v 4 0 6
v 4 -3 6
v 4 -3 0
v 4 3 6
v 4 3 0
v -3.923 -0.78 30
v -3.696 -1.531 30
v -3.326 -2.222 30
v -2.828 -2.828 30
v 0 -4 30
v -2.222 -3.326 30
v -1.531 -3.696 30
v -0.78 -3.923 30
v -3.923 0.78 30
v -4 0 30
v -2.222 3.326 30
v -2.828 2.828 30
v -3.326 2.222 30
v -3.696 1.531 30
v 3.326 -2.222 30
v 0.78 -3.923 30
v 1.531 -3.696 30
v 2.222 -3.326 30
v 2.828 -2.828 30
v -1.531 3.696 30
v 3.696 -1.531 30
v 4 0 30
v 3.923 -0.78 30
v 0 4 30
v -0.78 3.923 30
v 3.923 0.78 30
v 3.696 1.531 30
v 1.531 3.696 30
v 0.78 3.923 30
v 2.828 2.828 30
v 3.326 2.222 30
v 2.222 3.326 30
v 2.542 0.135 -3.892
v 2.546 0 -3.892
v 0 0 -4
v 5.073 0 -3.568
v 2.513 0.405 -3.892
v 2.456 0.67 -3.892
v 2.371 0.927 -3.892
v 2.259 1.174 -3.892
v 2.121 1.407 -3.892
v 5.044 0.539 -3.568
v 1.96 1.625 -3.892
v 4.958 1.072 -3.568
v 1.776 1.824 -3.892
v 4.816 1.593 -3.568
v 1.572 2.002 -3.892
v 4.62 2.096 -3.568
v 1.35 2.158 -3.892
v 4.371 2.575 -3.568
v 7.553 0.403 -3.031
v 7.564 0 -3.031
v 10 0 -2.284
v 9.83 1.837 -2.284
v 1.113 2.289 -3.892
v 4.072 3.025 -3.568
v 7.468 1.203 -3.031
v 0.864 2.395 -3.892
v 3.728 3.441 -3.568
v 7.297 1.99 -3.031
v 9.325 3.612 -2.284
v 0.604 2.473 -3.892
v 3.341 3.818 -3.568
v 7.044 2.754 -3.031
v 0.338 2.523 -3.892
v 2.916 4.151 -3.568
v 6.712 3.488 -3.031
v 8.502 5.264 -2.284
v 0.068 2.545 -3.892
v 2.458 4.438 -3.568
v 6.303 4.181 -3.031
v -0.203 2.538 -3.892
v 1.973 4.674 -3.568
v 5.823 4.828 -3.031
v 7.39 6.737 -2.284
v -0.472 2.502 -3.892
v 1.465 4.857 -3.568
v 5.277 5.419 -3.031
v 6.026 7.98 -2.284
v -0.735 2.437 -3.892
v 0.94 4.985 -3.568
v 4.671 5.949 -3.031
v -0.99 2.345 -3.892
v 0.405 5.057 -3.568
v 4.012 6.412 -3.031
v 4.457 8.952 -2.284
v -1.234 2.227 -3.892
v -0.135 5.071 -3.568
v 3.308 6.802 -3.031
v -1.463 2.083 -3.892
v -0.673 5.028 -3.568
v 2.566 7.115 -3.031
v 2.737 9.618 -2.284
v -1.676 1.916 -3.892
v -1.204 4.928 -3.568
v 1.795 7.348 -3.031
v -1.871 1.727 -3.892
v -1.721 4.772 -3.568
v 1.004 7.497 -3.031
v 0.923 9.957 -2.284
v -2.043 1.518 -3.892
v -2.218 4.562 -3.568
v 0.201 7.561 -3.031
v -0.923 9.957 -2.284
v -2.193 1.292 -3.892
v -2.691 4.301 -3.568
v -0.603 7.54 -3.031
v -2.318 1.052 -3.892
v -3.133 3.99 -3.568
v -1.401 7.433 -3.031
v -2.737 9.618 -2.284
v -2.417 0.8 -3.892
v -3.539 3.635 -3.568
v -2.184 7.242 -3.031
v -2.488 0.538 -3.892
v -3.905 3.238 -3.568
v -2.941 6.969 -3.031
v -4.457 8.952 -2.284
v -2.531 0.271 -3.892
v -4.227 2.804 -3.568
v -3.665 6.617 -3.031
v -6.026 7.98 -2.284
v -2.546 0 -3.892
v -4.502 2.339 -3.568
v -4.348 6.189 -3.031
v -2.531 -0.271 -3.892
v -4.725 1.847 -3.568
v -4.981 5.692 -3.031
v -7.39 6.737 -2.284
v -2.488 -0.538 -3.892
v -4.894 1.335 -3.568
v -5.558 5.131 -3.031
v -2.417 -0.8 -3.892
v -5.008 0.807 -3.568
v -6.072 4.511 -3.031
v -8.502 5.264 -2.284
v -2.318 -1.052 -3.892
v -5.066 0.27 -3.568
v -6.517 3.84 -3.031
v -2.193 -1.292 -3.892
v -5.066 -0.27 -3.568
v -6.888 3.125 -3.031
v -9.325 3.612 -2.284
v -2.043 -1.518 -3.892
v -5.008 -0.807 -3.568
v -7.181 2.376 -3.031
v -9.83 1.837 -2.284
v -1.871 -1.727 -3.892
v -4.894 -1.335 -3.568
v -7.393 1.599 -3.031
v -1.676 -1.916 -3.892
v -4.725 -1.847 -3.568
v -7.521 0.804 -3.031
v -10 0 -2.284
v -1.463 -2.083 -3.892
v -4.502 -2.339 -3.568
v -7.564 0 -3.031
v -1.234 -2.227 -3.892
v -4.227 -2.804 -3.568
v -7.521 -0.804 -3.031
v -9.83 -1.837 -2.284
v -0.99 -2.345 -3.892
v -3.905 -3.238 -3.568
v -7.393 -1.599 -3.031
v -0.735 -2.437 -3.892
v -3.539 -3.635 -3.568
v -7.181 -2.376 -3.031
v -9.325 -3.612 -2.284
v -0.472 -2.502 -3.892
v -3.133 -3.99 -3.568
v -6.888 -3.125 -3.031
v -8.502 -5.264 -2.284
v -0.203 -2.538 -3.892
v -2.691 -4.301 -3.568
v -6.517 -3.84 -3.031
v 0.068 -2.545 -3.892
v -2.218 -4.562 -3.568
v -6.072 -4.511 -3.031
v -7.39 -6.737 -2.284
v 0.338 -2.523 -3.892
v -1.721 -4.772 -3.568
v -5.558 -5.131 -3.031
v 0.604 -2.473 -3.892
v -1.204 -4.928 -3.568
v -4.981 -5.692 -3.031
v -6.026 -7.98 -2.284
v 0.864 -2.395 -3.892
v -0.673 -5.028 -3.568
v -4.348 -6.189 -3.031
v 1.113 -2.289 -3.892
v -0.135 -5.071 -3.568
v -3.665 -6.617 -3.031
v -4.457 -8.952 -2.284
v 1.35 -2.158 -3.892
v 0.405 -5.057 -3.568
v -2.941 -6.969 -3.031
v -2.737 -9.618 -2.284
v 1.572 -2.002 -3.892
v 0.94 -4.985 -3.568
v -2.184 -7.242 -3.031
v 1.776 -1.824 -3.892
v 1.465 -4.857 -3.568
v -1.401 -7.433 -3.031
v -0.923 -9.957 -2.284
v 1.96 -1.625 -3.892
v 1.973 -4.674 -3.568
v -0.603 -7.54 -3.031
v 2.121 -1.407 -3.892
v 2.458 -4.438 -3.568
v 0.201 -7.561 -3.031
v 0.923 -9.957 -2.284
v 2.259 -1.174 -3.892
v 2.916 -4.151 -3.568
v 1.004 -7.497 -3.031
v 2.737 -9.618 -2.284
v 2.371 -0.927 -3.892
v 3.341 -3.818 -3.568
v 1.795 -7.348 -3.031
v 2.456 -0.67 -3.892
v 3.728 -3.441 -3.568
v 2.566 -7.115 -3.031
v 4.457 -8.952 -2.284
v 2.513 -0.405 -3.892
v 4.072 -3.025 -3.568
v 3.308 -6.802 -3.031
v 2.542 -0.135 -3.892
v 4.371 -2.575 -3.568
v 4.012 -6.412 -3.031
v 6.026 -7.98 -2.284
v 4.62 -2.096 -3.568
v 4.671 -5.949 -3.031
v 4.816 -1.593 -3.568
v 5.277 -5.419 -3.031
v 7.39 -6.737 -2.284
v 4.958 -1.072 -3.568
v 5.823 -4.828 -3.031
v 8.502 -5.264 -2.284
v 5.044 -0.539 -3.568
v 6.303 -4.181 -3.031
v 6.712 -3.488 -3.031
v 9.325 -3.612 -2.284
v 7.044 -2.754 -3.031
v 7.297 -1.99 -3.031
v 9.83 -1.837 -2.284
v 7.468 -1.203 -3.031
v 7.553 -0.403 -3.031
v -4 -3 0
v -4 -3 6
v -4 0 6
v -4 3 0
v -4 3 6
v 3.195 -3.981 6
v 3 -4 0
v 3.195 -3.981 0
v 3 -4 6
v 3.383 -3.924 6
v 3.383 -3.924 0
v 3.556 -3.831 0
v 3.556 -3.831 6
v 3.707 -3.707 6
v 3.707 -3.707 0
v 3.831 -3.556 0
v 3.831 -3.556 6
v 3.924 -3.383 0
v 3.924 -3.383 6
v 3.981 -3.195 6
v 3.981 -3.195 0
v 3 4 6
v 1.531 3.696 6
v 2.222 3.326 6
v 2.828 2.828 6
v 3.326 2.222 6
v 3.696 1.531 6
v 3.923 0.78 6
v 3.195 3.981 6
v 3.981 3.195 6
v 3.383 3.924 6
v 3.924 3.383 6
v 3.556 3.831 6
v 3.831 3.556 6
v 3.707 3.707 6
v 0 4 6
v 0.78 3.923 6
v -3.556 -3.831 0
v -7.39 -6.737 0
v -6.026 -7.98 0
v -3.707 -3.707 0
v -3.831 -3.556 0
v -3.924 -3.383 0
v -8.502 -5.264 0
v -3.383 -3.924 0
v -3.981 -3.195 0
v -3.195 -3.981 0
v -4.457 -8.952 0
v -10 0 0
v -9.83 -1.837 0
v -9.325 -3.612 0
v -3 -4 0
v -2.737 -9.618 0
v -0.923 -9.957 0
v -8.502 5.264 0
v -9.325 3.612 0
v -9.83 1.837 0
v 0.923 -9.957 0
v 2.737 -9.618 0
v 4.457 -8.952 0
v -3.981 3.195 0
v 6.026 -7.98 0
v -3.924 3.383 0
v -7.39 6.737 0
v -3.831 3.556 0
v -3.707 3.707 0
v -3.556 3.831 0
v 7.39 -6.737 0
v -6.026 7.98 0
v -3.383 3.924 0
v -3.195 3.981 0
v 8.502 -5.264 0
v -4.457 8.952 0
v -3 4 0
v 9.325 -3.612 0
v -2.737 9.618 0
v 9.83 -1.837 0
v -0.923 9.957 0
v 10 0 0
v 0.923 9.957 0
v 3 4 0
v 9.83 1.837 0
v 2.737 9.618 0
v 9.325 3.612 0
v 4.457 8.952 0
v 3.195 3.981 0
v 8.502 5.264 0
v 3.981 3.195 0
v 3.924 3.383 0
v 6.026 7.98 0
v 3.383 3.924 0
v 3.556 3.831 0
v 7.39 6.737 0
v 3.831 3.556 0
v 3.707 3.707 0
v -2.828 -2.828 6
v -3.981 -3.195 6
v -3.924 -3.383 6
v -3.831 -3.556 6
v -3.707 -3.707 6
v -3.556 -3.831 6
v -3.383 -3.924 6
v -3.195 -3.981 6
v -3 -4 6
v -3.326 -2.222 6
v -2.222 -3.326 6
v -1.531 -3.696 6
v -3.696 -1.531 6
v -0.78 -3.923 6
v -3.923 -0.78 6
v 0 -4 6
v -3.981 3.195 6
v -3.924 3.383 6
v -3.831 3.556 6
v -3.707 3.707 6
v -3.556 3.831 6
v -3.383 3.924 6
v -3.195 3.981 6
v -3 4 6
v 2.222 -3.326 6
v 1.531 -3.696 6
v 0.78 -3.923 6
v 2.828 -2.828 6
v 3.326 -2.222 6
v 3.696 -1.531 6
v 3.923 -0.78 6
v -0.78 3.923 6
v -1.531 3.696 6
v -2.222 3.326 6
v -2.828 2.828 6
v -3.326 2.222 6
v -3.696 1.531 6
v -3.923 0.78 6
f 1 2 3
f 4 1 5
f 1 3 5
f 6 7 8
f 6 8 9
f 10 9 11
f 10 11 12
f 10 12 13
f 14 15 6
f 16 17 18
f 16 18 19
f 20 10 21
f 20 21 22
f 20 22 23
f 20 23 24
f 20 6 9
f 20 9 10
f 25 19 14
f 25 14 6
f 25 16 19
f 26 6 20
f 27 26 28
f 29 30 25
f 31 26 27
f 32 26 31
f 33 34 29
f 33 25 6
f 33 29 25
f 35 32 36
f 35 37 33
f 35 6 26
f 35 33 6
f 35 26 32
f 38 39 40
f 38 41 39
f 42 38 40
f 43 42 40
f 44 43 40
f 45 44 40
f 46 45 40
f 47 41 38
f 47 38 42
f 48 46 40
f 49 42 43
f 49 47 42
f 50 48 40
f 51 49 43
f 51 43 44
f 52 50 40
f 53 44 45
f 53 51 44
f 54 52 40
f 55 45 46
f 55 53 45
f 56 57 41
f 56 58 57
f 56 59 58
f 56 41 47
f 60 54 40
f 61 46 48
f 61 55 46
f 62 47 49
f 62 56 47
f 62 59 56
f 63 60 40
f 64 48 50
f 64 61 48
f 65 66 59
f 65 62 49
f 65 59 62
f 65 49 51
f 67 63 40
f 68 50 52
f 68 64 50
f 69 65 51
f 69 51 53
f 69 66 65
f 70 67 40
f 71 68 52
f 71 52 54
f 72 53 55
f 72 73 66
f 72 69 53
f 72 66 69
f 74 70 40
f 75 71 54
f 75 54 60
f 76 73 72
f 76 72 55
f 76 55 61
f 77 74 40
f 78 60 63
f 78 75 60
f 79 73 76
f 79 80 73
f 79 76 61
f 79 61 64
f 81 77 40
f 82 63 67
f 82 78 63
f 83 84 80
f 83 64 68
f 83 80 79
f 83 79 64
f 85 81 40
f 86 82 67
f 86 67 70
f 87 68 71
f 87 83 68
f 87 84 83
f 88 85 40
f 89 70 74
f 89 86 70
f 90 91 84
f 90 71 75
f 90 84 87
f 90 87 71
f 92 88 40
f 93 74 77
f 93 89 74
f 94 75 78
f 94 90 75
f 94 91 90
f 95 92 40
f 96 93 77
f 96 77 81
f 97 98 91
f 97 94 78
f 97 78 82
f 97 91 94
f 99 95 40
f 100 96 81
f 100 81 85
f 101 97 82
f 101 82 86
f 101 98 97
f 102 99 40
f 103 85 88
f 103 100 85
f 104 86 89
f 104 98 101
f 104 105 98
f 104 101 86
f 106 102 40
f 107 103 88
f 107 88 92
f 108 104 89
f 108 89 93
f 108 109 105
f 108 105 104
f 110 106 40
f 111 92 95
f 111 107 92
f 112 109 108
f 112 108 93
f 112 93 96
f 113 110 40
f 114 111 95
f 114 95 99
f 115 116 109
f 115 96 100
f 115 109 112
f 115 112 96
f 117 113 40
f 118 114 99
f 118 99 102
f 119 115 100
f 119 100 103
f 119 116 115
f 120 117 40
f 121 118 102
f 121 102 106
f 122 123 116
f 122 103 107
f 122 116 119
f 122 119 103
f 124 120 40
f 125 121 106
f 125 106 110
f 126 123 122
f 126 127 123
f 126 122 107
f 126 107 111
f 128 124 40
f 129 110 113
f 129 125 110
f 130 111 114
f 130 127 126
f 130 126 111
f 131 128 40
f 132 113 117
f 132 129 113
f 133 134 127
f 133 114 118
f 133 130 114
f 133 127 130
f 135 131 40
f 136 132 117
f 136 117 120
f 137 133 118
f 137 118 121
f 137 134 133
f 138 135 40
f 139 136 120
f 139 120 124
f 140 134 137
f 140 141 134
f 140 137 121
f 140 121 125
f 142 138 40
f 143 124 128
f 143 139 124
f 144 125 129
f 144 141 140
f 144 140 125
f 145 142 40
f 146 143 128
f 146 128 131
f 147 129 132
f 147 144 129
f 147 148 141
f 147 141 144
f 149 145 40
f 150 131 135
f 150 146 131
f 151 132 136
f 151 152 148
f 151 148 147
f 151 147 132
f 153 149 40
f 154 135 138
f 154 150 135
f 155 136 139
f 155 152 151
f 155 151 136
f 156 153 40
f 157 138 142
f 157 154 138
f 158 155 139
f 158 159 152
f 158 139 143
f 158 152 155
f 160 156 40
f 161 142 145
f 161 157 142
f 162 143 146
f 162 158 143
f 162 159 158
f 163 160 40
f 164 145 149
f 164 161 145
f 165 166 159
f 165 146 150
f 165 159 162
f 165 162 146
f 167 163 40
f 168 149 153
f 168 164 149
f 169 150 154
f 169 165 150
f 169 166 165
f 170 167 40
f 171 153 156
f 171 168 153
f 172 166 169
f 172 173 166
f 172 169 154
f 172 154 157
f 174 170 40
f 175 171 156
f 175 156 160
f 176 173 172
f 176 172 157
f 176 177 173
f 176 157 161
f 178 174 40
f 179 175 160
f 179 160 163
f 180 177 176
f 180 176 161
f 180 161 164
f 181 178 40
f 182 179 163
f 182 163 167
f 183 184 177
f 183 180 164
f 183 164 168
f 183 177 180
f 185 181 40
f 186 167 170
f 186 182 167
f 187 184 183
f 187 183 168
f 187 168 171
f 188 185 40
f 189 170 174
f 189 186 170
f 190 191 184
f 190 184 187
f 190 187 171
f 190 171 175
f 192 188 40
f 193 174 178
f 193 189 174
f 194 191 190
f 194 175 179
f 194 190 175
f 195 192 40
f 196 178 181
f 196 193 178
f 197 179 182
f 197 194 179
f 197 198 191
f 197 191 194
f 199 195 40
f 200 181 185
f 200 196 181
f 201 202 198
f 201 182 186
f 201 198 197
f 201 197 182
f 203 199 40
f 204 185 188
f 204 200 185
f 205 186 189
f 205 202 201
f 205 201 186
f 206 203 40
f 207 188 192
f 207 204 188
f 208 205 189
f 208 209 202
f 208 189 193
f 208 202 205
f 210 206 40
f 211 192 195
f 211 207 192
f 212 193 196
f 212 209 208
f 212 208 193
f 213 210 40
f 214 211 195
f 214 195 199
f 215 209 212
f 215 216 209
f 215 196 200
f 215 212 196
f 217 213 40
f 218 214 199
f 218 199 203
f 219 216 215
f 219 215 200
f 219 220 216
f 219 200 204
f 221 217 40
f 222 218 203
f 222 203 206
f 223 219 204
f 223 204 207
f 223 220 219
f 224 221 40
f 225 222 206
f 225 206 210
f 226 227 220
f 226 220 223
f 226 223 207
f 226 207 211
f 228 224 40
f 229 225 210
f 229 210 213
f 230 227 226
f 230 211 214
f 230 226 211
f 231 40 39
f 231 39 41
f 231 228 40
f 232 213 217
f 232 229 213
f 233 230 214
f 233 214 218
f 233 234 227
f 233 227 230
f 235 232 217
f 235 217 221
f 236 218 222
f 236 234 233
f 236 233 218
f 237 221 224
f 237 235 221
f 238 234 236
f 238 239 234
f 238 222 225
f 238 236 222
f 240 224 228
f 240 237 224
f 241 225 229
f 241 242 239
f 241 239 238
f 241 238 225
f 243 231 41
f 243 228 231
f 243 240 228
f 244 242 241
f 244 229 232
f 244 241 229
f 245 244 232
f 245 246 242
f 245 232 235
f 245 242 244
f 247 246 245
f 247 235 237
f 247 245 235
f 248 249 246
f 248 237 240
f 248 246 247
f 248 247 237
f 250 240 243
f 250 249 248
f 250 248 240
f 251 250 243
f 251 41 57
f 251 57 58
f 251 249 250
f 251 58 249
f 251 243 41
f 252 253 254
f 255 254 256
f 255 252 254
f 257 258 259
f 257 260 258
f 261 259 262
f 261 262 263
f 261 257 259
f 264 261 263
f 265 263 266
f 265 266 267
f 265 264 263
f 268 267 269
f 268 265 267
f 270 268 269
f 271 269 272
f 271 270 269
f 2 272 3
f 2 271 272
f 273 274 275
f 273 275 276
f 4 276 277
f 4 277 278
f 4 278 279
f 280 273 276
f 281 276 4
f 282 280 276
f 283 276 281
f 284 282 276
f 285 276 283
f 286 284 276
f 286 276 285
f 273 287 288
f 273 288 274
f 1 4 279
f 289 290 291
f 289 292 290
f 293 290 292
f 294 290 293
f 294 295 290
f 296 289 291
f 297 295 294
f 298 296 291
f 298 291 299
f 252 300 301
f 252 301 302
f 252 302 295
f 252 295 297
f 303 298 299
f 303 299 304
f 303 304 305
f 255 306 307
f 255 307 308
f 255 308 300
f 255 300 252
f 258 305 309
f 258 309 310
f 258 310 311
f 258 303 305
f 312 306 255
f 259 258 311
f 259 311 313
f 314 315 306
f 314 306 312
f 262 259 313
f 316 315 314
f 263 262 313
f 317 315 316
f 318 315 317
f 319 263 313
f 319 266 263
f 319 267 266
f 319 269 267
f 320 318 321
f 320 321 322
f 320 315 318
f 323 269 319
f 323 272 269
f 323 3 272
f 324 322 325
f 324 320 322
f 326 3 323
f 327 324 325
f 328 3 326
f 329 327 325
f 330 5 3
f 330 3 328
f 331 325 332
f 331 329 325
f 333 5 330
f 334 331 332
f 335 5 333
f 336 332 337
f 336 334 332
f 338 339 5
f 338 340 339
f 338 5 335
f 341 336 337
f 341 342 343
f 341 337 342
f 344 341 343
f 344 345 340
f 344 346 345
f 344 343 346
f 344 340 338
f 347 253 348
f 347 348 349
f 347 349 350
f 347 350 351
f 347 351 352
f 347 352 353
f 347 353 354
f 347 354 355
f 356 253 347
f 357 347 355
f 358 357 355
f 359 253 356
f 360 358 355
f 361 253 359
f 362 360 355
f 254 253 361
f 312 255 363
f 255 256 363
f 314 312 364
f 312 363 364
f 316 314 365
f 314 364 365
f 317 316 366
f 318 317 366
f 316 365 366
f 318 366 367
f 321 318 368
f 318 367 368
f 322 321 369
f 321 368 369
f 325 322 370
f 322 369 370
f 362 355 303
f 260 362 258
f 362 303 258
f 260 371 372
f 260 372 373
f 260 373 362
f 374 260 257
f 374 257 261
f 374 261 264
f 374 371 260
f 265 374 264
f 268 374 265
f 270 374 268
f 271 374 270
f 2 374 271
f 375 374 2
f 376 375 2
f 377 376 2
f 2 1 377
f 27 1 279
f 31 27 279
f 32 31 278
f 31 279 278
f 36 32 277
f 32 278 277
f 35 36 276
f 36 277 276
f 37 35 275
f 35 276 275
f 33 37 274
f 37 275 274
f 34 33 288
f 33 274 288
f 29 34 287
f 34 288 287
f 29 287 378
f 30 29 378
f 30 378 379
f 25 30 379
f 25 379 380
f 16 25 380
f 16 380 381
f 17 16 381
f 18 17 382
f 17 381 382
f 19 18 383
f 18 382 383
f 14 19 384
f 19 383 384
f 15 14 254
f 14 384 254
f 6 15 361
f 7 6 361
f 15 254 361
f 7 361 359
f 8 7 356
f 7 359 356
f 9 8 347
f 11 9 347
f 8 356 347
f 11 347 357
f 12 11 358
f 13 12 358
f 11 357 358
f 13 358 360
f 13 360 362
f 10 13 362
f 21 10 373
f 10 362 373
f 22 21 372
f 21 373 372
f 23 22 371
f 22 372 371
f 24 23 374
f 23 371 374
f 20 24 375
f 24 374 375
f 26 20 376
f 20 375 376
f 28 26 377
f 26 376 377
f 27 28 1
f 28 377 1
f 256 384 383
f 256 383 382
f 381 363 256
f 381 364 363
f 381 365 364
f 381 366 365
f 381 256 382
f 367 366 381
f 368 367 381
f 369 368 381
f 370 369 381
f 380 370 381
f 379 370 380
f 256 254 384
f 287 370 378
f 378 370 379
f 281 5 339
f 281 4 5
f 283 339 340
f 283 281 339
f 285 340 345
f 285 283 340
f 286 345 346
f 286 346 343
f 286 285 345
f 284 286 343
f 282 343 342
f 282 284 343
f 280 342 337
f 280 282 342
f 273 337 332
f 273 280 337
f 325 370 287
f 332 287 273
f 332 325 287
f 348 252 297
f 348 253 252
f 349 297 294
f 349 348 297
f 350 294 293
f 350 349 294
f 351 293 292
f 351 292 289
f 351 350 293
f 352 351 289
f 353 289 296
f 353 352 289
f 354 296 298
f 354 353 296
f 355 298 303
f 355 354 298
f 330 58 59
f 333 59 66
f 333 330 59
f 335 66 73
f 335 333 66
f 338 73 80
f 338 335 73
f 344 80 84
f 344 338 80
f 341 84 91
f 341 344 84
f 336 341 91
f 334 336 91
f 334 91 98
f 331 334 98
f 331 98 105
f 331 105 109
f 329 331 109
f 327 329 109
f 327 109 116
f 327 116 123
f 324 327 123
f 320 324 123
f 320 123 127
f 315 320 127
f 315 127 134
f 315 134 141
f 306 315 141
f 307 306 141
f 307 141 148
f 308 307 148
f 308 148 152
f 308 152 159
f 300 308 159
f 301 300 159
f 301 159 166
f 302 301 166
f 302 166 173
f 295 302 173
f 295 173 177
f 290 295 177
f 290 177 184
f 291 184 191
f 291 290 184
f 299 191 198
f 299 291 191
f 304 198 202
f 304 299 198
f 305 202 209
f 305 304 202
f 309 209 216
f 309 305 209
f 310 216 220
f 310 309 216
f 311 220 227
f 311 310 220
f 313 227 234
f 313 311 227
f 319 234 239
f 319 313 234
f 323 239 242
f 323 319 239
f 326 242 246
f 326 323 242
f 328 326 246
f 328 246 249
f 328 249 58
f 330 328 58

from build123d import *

# Parameters (mm, degrees)
SKETCH_R     = 4
PAD_DEPTH    = 30
SKETCH001_W  = 8
SKETCH001_H  = 8
PAD001_DEPTH = 6
SKETCH002_R  = 10
PAD002_DEPTH = 10
FILLET_R     = 1


with BuildPart() as body001:
    # Sphere → Sphere (revolve)
    with BuildSketch(Plane.XZ):
        with BuildLine():
            ThreePointArc((0, -30), (30, 0), (0, 30))
            Line((0, 30), (0, -30))
        make_face()
    revolve(axis=Axis((0, 0, 0), (0, 0, 1)))


with BuildPart() as body001_1:
    # Body001 placement: moved
    add(body001.part.moved(Location((0, 0, 26))))


with BuildPart() as fillet_body:
    # Sketch → Pad (new body)
    with BuildSketch(Plane.XY):
        Circle(SKETCH_R)
    extrude(amount=PAD_DEPTH)

    # Sketch001 → Pad001 (join)
    with BuildSketch(Plane.XY):
        Rectangle(SKETCH001_W, SKETCH001_H)
    extrude(amount=PAD001_DEPTH)

    # Sketch002 → Pad002 (join)
    with BuildSketch(Plane.XY):
        Circle(SKETCH002_R)
    extrude(amount=-PAD002_DEPTH)

    # Common: intersect Body001
    add(body001_1.part, mode=Mode.INTERSECT)

    # Fillet
    fillet_edges = [fillet_body.edges().sort_by_distance(p)[0] for p in [
        (4, 4, 3),
        (-4, 4, 3),
        (-4, -4, 3),
        (4, -4, 3),
    ]]
    fillet(fillet_edges, radius=FILLET_R)


solid = fillet_body.part
